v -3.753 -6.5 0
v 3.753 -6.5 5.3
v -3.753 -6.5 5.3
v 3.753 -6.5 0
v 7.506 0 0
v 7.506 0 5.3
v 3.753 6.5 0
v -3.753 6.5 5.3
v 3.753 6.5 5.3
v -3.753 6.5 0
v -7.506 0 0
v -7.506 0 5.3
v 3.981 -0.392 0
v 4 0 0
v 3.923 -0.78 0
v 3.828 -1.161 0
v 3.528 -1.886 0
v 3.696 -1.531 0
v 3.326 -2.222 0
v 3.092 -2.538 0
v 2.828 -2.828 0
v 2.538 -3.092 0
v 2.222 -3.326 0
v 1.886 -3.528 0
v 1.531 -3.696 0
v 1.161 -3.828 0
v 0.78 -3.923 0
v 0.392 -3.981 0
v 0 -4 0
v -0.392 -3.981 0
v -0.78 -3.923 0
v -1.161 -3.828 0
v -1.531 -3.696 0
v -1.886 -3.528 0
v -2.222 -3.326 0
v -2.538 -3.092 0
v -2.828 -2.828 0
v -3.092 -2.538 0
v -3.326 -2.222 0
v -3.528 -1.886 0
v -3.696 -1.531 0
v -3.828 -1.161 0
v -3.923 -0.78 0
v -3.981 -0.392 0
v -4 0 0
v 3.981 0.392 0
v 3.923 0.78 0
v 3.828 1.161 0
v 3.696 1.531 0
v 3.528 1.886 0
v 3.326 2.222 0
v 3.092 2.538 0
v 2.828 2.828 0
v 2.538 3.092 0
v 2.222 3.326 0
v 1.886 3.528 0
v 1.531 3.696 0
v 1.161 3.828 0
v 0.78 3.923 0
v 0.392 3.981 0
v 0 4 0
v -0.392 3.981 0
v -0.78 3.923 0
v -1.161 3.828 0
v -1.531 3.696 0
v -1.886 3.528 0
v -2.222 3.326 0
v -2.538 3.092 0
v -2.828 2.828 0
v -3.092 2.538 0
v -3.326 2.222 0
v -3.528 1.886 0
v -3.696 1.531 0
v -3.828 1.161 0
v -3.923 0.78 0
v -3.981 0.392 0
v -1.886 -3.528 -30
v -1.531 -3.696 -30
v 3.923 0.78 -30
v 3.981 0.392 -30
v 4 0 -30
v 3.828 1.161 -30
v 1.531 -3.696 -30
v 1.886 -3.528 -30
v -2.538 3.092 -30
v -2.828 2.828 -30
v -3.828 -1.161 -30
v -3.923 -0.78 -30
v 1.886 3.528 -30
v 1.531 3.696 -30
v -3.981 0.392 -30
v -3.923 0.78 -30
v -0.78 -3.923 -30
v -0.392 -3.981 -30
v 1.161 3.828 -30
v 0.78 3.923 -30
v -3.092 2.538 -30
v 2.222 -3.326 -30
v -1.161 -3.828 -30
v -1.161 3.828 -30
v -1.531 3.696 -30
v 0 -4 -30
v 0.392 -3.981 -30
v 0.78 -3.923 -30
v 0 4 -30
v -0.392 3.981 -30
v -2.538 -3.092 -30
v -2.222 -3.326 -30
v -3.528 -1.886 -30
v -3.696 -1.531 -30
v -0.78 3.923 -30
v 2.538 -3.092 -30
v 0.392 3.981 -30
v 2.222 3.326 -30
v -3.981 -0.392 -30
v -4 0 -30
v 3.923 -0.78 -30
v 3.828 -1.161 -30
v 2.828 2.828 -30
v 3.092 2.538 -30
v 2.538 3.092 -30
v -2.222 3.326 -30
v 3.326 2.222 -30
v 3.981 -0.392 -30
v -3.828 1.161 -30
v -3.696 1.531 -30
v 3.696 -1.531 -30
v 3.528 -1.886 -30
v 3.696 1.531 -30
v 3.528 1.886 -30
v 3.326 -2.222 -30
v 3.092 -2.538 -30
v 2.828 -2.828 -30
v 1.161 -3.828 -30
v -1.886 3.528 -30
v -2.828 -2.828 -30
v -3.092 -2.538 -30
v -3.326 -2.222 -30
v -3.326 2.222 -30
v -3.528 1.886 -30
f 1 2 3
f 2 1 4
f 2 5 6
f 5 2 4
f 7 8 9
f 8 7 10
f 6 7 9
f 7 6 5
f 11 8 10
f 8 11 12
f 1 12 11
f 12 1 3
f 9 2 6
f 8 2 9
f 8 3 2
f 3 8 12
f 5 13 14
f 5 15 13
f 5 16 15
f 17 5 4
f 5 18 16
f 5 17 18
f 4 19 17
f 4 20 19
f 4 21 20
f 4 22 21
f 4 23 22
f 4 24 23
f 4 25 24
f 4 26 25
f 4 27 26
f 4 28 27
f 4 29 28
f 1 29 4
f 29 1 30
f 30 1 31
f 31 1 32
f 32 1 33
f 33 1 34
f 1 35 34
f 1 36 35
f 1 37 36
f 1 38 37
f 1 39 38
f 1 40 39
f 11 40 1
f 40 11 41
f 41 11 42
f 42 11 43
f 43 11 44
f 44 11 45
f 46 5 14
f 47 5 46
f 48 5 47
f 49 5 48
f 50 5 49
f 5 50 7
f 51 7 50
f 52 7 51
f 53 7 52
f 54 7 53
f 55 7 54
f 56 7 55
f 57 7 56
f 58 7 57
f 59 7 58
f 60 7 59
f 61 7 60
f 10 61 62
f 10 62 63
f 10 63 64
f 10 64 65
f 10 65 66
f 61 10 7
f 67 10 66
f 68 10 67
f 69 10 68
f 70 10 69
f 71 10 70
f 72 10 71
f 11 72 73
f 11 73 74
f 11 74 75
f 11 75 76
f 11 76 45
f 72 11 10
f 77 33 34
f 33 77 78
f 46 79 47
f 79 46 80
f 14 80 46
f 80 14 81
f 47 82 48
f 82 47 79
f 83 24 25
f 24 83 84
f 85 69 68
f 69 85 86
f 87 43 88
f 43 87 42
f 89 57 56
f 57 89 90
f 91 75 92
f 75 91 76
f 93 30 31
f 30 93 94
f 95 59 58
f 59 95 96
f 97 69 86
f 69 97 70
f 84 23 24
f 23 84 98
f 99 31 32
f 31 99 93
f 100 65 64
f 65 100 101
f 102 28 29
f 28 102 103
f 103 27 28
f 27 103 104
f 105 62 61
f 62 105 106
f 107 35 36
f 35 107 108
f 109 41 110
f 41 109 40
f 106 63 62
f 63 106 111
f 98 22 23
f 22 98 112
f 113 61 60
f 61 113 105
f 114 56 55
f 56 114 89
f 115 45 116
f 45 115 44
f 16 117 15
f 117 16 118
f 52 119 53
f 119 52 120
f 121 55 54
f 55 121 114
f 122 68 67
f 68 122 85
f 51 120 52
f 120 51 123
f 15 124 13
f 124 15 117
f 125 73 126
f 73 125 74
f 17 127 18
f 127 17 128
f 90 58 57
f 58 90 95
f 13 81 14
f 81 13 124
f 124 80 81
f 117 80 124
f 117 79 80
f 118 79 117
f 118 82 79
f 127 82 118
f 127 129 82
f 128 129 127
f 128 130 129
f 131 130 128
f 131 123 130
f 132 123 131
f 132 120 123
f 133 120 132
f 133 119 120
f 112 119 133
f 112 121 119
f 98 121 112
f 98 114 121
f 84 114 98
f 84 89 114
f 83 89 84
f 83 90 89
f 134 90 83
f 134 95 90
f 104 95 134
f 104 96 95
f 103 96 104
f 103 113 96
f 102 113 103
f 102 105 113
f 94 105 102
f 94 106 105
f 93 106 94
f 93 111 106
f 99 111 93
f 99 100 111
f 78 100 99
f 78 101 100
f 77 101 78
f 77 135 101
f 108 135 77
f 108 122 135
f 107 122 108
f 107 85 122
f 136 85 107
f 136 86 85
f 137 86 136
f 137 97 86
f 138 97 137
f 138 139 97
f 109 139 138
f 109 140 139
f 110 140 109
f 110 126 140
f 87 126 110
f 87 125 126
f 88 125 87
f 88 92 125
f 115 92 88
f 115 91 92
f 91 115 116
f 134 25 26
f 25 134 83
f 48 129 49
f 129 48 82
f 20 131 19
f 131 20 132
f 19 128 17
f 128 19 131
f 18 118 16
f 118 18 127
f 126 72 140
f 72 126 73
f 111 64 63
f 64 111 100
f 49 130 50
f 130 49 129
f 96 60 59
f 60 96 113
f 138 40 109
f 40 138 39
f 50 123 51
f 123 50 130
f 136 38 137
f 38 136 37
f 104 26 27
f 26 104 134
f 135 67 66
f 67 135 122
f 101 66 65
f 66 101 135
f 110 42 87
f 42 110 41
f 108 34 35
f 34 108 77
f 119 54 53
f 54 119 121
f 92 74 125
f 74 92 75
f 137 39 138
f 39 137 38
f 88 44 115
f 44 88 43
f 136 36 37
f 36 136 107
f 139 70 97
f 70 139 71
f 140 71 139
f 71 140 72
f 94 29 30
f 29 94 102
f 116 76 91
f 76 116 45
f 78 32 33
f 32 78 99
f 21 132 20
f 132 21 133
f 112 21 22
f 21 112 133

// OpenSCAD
// ===== M8 六角ボルト パラメータ =====
af           = 13;    // 対辺距離 (across-flats) [mm]
head_height  = 5.3;   // 頭部高さ [mm]
shank_dia    = 8;     // シャンク直径 [mm]
shank_length = 30;    // シャンク長さ [mm]

// 対辺距離から六角柱の外接円直径を算出
// af = 2 * R * cos(30°)  →  R = af / (2*cos(30°))  →  直径 = af / cos(30°)
hex_dia = af / cos(30);

module hex_bolt() {
    // 頭部(六角柱): 底面が z=0 に位置し、+Z方向へ伸びる
    cylinder(h = head_height, d = hex_dia, $fn = 6);

    // シャンク(円柱): z=0 から -Z方向へ伸びる
    translate([0, 0, -shank_length])
        cylinder(h = shank_length, d = shank_dia, $fn = 64);
}

hex_bolt();
